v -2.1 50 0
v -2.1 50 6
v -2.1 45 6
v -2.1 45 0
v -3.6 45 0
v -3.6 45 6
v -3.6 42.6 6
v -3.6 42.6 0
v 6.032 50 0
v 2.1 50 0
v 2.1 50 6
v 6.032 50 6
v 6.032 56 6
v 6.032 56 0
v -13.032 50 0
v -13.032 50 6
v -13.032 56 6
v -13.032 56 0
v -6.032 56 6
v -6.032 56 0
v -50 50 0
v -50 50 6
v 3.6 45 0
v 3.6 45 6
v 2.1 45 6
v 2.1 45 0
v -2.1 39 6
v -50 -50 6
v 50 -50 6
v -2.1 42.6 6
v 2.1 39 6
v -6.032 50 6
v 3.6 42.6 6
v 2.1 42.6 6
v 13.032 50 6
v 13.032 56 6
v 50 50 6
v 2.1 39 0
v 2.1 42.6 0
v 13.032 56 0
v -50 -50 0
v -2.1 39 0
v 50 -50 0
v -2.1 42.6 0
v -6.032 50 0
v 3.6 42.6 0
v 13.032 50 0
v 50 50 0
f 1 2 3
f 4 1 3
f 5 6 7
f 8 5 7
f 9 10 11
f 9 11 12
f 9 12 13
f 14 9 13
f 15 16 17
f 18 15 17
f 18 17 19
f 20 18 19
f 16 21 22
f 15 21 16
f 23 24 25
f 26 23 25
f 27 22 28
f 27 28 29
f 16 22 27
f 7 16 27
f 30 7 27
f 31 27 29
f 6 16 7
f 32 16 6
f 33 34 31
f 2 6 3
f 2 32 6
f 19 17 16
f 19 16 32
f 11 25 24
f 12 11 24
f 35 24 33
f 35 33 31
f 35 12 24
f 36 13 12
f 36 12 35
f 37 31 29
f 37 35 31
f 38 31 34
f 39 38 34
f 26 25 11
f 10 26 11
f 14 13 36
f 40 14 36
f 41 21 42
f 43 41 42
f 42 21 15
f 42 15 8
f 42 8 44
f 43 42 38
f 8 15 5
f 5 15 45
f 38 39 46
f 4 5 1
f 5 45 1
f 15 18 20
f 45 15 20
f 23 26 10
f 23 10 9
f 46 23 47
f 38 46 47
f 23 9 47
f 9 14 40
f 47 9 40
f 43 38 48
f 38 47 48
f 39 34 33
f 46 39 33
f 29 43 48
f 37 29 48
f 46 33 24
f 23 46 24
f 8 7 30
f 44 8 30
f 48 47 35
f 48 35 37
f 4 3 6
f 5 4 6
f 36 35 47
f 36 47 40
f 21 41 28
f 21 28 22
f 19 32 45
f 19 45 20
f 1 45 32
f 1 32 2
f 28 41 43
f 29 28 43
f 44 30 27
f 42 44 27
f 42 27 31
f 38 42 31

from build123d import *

# Parameters (mm, degrees)
SKETCH_1_W          = 100
SKETCH_1_H          = 100
EXTRUDE_1_DEPTH     = 6
SKETCH_2_W          = 7
SKETCH_2_H          = 6
EXTRUDE_2_DEPTH     = 6
CUT_EXTRUDE_1_DEPTH = 7


with BuildPart() as part:
    # Эскиз1 → Бобышка-Вытянуть1 (new body)
    with BuildSketch(Plane.XY):
        Rectangle(SKETCH_1_W, SKETCH_1_H)
    extrude(amount=EXTRUDE_1_DEPTH)

    # Эскиз2 → Бобышка-Вытянуть2 (add)
    with BuildSketch(Plane.XY.offset(6)):
        with Locations((-9.531849908, 53)):
            Rectangle(SKETCH_2_W, SKETCH_2_H)
        with Locations((9.531849908, 53)):
            Rectangle(SKETCH_2_W, SKETCH_2_H)
    extrude(amount=-EXTRUDE_2_DEPTH)

    # Эскиз3 → Вырез-Вытянуть1 (cut, through all)
    with BuildSketch(Plane.XY.offset(6)):
        Polygon((-2.1, 45), (-3.6, 45), (-3.6, 42.6), (-2.1, 42.6), (-2.1, 39), (2.1, 39), (2.1, 42.6), (3.6, 42.6), (3.6, 45), (2.1, 45), (2.1, 50), (-2.1, 50), align=None)
    extrude(amount=-CUT_EXTRUDE_1_DEPTH, mode=Mode.SUBTRACT)


solid = part.part
